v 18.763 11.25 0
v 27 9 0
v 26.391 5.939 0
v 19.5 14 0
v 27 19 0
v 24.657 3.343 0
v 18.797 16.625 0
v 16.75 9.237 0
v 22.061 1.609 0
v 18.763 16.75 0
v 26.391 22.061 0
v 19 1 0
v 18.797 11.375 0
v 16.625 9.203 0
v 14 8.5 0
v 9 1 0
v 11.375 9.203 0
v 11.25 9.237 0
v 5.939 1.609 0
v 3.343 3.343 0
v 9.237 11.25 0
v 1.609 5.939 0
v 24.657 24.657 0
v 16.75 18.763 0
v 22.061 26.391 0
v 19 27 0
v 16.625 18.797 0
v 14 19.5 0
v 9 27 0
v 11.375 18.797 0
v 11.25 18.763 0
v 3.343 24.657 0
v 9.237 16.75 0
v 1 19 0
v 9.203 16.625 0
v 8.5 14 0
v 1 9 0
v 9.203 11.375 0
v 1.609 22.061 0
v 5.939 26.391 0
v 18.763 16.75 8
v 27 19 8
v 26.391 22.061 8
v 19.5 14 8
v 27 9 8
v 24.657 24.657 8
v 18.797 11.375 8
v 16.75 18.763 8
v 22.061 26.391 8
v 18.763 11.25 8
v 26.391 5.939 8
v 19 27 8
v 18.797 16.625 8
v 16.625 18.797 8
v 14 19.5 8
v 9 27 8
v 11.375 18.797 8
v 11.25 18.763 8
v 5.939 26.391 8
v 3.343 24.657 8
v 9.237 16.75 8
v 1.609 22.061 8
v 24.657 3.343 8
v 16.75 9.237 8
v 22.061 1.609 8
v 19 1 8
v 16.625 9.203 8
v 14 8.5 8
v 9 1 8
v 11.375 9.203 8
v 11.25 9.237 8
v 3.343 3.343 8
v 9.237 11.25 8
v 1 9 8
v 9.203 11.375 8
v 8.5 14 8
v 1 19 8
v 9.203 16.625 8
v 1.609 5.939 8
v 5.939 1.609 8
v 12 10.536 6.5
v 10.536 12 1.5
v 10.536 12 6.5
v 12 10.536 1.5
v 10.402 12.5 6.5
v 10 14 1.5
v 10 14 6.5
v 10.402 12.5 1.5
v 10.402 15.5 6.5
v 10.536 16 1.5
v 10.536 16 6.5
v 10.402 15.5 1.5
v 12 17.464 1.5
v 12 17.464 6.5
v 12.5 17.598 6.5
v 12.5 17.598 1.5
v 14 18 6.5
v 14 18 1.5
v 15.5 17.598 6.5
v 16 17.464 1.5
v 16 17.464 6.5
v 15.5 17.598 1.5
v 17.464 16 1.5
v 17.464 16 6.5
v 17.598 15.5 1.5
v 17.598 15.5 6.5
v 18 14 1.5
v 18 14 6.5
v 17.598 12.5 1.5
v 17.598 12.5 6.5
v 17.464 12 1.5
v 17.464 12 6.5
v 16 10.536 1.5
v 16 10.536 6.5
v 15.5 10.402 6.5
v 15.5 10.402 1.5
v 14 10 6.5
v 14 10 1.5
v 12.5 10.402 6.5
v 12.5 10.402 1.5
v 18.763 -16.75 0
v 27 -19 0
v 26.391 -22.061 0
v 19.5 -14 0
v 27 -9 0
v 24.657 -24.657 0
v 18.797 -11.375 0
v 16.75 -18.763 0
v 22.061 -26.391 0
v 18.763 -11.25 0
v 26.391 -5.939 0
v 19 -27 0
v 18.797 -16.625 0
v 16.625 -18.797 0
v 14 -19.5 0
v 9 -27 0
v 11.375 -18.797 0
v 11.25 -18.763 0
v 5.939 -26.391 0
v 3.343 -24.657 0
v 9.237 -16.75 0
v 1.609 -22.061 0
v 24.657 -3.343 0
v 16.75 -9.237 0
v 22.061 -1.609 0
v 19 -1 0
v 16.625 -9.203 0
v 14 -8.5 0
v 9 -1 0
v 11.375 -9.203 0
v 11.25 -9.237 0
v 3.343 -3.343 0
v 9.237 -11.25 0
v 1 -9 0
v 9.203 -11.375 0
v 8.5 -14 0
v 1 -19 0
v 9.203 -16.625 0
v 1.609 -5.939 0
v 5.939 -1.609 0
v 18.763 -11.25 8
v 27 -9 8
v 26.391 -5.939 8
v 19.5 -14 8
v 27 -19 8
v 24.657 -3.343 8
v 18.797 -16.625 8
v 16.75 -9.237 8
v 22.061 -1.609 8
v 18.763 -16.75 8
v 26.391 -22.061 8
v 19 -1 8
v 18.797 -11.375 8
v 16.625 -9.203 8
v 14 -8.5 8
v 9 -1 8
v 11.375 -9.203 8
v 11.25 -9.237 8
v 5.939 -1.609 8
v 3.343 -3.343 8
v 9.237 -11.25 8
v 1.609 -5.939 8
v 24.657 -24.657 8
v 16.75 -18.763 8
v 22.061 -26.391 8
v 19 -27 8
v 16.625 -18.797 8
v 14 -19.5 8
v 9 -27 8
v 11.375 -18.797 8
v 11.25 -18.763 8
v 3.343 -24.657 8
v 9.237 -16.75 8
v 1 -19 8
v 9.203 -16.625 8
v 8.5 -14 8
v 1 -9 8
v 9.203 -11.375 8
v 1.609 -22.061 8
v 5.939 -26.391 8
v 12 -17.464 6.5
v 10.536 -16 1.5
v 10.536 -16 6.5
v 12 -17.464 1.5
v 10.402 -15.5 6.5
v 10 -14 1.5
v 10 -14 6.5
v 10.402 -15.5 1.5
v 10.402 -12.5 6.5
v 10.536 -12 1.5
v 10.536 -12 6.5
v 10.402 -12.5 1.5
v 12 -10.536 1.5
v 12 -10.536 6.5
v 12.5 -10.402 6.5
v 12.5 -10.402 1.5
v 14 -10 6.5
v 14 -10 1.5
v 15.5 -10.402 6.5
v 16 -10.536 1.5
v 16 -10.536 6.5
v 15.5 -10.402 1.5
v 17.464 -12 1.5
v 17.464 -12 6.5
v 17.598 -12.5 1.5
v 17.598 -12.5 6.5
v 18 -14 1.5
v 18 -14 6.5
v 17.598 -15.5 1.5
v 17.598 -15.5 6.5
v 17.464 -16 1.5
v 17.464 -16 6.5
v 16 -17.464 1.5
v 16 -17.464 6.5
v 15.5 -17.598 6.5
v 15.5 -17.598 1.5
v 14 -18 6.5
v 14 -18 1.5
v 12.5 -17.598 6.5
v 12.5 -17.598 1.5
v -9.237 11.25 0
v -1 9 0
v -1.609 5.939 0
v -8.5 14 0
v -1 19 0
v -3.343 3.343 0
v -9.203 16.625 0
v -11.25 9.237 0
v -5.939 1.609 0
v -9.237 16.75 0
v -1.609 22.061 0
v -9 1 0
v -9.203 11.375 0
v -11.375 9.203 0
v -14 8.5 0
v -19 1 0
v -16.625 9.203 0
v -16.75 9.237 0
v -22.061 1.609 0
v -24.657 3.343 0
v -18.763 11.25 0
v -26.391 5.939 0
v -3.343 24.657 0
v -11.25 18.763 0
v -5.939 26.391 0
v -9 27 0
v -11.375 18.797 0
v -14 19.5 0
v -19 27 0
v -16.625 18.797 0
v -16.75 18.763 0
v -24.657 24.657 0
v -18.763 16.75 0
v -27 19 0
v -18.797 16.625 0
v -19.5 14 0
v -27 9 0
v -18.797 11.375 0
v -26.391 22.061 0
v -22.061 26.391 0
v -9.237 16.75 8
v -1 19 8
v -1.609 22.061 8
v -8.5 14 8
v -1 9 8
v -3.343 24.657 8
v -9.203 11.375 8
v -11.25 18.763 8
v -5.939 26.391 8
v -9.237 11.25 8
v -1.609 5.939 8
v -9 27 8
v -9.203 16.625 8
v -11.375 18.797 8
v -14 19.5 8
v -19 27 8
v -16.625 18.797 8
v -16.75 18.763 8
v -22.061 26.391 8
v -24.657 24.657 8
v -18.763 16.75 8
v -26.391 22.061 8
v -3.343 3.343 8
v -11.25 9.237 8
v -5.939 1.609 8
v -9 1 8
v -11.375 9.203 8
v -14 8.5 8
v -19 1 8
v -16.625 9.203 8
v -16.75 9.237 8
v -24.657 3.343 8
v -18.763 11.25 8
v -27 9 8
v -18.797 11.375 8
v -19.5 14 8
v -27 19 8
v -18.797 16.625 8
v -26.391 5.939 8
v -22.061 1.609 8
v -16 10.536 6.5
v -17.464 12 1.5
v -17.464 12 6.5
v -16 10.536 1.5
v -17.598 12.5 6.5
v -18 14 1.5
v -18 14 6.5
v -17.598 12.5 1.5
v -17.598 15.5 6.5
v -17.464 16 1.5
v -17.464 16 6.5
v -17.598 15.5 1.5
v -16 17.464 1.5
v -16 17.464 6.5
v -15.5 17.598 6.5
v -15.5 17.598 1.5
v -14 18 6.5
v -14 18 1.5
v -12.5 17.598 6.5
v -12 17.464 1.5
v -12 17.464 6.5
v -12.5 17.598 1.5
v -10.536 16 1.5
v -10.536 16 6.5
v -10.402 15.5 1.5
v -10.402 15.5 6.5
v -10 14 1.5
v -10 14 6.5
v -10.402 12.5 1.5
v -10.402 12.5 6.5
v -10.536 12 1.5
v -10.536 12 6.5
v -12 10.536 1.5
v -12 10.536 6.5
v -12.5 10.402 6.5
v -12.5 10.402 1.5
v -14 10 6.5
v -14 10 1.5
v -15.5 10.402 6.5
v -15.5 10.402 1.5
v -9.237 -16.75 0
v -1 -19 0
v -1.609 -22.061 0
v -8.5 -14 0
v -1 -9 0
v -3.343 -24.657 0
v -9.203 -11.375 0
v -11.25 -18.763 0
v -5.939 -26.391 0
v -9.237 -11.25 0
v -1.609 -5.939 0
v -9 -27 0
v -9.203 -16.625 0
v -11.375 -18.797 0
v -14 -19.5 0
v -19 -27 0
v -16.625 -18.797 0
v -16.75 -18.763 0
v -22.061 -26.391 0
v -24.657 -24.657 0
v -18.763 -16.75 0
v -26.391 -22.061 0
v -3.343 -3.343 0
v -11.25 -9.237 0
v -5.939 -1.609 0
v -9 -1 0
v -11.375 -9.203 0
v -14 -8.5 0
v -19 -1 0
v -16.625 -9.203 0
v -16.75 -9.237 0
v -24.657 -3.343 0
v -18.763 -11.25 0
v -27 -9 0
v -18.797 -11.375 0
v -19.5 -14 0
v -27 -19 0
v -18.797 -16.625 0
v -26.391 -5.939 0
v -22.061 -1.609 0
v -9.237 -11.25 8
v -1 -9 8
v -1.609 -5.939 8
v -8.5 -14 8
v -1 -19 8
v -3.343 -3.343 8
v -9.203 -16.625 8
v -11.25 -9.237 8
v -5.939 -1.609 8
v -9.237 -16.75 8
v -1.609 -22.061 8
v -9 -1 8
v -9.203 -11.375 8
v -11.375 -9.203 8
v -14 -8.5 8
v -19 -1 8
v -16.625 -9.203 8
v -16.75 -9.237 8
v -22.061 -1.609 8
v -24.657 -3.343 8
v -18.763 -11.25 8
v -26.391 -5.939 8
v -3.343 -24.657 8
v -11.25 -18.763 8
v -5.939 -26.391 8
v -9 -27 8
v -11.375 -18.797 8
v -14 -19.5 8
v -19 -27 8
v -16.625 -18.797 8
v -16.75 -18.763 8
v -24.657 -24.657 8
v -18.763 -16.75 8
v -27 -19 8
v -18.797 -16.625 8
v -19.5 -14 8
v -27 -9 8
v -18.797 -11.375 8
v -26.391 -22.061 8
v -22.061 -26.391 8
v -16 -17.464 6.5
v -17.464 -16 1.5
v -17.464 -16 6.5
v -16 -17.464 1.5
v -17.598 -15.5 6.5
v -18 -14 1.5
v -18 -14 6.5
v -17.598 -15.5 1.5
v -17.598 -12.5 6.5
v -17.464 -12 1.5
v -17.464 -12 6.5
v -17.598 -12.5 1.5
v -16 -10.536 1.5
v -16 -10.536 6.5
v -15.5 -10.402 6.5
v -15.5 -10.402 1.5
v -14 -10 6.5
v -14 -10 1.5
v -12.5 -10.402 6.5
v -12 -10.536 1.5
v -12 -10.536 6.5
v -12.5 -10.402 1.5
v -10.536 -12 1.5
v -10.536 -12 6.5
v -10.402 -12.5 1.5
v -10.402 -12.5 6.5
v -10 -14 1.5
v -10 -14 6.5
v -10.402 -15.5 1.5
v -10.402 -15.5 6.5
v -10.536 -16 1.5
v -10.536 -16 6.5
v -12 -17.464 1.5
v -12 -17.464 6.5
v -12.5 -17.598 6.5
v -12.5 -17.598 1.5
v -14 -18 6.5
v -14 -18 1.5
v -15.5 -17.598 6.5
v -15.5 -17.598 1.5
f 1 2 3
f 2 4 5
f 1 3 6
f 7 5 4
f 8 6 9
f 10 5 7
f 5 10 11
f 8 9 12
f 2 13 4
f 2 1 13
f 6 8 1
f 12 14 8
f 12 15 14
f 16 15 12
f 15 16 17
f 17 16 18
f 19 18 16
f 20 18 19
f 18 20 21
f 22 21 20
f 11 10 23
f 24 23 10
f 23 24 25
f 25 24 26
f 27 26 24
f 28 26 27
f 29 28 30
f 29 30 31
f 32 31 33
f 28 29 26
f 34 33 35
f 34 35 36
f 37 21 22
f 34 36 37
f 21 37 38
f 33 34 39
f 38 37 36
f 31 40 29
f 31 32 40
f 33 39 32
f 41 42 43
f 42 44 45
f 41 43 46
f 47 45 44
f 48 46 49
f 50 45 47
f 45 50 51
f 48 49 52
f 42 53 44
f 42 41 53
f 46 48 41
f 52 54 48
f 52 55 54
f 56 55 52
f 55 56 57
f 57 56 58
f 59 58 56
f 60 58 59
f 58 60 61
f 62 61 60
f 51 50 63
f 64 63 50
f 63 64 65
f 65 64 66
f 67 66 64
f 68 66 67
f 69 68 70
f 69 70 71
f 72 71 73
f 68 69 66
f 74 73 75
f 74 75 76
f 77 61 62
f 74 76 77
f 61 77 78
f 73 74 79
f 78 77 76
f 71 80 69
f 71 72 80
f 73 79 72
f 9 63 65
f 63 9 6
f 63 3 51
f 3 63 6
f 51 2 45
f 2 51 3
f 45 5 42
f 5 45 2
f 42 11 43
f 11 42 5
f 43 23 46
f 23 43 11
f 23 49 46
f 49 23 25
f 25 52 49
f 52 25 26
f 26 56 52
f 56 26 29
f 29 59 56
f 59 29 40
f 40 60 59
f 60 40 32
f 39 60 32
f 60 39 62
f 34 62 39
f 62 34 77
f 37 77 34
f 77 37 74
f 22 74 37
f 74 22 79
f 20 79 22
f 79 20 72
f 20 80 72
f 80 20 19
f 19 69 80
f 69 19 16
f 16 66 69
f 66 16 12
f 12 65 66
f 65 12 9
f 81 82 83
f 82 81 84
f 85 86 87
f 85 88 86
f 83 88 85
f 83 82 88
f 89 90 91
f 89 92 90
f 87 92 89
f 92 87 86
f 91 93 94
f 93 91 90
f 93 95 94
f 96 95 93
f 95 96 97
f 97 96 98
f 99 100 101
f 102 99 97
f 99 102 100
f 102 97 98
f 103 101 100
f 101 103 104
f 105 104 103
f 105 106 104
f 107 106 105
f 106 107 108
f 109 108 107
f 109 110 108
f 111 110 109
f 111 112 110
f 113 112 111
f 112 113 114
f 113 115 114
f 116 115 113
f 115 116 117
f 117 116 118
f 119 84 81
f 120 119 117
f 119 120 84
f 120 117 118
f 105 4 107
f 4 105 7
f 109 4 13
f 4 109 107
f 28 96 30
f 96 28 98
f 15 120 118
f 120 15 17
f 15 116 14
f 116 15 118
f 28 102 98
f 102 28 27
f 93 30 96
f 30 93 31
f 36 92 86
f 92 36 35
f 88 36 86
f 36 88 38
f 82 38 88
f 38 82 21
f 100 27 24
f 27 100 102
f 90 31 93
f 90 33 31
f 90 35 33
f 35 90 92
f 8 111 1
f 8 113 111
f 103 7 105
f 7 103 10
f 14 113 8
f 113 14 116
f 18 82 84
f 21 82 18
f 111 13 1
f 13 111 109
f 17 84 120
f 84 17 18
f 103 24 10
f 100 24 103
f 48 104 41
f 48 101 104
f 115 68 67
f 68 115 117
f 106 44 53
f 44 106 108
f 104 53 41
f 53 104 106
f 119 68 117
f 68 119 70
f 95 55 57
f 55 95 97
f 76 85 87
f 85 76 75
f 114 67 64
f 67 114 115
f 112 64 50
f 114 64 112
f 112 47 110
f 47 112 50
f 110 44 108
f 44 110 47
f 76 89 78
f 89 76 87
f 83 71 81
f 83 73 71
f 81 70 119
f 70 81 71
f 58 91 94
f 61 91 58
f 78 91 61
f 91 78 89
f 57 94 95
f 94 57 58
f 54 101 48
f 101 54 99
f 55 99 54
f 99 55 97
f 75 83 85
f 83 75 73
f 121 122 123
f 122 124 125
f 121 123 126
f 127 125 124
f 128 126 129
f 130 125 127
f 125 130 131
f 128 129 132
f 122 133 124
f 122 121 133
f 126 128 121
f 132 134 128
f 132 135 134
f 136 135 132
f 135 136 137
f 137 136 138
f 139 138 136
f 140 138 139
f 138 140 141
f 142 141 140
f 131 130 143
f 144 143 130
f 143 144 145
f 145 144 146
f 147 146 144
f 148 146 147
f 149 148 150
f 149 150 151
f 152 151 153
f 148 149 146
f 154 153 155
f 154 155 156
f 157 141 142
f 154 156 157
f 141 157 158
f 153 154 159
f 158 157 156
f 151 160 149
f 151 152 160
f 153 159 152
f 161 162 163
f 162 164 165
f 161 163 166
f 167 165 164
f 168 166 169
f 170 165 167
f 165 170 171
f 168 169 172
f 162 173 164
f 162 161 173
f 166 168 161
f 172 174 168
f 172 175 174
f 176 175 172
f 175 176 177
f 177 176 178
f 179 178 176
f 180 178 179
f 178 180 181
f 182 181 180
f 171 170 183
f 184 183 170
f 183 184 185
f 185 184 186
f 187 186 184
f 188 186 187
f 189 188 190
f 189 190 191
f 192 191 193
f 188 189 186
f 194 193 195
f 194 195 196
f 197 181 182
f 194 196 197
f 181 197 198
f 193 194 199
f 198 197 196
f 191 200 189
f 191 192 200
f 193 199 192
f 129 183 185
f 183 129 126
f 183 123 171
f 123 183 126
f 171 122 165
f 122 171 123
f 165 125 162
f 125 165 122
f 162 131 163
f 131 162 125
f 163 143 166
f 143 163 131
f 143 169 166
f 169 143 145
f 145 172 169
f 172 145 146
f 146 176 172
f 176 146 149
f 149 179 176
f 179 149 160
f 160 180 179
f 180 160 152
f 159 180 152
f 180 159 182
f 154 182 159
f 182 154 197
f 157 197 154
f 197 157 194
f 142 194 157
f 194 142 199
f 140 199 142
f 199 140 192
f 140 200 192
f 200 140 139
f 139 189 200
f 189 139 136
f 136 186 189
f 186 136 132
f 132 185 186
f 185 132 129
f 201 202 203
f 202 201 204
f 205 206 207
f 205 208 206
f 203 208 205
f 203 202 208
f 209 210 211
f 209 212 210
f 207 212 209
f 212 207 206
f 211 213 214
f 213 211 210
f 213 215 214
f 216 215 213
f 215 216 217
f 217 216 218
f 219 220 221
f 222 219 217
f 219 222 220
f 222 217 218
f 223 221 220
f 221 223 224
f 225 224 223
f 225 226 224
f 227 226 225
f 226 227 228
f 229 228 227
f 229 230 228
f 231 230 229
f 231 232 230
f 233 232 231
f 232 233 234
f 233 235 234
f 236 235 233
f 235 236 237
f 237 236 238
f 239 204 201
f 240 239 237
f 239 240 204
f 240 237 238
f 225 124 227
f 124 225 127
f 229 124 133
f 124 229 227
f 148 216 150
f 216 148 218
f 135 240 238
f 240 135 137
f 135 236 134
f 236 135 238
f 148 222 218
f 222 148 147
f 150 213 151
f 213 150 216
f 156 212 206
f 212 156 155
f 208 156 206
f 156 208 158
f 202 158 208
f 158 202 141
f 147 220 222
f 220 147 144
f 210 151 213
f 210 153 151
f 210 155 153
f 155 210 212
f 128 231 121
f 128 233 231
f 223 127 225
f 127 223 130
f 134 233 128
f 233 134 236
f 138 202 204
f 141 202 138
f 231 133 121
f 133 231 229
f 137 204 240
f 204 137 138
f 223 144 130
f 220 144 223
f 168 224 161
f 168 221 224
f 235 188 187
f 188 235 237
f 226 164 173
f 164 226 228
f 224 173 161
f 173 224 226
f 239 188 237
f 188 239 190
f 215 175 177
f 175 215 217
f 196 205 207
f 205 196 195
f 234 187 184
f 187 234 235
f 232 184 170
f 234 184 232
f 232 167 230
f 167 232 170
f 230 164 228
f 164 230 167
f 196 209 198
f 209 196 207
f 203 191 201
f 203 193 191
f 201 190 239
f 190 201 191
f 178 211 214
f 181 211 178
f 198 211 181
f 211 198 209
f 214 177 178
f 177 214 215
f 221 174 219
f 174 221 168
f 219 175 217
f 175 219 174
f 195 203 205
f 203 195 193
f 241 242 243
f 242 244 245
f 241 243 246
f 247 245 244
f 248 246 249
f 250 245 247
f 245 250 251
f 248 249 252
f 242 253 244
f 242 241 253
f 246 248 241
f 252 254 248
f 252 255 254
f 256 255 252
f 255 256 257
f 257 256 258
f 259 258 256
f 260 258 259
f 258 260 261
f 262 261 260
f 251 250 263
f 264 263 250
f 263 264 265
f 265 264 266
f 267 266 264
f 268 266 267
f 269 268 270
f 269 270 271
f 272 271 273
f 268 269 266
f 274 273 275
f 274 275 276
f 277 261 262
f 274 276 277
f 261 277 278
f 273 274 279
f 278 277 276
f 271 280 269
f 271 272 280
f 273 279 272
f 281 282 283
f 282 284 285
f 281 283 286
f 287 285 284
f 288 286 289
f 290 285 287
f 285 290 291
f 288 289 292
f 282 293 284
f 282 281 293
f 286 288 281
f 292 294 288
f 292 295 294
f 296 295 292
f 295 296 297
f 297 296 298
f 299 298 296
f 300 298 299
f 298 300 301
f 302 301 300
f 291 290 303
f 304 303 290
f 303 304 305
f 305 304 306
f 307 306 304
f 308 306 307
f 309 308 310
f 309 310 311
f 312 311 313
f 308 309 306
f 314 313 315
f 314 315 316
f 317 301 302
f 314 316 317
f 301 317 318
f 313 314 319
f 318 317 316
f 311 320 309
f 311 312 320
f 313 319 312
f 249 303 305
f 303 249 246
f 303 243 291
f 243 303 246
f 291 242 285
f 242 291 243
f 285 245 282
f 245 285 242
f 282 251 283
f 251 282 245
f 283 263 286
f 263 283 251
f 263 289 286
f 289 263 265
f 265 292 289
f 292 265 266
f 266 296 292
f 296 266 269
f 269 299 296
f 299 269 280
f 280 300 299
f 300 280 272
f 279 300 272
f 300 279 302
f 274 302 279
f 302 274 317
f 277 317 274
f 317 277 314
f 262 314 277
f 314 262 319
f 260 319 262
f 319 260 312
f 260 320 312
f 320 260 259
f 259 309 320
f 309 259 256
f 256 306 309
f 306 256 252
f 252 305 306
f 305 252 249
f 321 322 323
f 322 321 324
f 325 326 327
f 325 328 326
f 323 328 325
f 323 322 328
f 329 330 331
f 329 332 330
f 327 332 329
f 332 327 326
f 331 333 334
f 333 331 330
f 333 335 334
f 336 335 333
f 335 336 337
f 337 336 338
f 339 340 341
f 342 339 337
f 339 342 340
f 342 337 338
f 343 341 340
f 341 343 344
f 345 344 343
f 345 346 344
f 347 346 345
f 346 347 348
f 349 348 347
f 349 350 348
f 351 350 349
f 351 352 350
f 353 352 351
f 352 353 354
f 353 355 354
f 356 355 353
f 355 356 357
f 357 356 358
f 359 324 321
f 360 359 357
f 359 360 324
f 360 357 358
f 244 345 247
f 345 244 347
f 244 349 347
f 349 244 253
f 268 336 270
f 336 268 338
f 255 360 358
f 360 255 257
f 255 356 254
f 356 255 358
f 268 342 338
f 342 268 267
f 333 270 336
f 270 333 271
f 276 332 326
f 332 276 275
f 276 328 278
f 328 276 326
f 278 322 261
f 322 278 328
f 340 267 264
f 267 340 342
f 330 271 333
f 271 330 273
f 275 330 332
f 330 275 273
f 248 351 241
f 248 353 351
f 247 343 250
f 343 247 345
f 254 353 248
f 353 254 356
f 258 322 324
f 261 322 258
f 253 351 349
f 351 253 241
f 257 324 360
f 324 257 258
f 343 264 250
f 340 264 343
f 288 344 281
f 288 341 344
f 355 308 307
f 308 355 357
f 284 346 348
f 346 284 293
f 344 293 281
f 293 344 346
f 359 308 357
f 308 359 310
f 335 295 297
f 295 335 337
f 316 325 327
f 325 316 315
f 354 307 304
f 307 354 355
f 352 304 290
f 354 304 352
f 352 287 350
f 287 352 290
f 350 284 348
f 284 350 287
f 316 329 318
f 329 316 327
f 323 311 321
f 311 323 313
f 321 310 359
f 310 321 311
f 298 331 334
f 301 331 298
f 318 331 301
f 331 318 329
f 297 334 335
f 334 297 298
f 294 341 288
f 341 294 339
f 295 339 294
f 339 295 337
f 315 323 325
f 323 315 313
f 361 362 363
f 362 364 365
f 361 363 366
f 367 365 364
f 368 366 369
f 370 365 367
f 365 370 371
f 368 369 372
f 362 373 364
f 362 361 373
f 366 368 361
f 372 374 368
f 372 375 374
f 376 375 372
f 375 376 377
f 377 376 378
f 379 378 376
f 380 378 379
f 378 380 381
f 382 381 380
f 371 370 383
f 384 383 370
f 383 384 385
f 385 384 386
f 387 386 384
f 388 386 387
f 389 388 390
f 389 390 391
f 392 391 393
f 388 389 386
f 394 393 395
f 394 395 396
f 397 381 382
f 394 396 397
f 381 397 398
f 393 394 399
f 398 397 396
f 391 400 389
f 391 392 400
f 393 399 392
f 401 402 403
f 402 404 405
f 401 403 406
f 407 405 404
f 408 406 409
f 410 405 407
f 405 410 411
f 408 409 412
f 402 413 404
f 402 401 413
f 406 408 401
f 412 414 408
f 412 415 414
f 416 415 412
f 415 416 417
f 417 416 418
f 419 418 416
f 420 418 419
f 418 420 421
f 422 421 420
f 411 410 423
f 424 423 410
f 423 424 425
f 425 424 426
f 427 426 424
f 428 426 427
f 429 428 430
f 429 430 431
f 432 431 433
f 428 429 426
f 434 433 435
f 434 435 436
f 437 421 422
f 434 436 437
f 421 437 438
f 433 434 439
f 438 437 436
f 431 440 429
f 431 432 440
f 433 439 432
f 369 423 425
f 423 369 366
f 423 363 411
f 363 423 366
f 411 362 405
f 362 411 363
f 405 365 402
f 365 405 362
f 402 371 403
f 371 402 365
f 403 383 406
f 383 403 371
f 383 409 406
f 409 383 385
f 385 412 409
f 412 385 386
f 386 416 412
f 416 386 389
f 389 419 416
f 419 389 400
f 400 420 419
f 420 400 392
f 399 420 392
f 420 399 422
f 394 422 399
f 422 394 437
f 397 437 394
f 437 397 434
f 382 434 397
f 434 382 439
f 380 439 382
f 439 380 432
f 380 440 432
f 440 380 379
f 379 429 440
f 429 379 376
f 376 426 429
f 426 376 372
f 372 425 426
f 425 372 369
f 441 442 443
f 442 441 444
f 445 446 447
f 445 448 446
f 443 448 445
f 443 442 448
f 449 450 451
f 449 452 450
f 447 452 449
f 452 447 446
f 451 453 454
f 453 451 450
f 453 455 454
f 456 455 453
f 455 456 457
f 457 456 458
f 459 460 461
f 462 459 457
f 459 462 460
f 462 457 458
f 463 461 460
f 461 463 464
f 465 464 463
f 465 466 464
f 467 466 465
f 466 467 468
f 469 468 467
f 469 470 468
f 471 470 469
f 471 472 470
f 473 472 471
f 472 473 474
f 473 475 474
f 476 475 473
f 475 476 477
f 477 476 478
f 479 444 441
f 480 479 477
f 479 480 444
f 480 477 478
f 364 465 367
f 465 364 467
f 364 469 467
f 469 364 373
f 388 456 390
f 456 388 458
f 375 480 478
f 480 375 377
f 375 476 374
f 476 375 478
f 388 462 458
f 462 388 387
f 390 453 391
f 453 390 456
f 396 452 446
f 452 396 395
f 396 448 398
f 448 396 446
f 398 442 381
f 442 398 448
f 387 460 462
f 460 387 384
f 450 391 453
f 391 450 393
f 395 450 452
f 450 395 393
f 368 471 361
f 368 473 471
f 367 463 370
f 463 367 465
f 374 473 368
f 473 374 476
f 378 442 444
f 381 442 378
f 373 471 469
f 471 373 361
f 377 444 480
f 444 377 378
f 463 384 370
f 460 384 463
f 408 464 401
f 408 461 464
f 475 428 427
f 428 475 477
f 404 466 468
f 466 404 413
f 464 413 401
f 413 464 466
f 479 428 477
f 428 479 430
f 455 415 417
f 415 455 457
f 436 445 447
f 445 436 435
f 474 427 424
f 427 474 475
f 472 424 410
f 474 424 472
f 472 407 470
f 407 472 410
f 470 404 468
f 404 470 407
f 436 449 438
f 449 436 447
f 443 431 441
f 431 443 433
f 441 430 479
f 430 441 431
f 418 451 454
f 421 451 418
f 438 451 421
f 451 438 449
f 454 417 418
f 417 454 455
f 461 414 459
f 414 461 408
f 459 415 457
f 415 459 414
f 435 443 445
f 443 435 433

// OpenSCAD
include <3dm1.scad>;

!for(x = [1, -1]) for(y = [1, -1]) translate([x * (rod_size * 1.5 + 2), y * (rod_size * 1.5 + 2), 0]) foot();
